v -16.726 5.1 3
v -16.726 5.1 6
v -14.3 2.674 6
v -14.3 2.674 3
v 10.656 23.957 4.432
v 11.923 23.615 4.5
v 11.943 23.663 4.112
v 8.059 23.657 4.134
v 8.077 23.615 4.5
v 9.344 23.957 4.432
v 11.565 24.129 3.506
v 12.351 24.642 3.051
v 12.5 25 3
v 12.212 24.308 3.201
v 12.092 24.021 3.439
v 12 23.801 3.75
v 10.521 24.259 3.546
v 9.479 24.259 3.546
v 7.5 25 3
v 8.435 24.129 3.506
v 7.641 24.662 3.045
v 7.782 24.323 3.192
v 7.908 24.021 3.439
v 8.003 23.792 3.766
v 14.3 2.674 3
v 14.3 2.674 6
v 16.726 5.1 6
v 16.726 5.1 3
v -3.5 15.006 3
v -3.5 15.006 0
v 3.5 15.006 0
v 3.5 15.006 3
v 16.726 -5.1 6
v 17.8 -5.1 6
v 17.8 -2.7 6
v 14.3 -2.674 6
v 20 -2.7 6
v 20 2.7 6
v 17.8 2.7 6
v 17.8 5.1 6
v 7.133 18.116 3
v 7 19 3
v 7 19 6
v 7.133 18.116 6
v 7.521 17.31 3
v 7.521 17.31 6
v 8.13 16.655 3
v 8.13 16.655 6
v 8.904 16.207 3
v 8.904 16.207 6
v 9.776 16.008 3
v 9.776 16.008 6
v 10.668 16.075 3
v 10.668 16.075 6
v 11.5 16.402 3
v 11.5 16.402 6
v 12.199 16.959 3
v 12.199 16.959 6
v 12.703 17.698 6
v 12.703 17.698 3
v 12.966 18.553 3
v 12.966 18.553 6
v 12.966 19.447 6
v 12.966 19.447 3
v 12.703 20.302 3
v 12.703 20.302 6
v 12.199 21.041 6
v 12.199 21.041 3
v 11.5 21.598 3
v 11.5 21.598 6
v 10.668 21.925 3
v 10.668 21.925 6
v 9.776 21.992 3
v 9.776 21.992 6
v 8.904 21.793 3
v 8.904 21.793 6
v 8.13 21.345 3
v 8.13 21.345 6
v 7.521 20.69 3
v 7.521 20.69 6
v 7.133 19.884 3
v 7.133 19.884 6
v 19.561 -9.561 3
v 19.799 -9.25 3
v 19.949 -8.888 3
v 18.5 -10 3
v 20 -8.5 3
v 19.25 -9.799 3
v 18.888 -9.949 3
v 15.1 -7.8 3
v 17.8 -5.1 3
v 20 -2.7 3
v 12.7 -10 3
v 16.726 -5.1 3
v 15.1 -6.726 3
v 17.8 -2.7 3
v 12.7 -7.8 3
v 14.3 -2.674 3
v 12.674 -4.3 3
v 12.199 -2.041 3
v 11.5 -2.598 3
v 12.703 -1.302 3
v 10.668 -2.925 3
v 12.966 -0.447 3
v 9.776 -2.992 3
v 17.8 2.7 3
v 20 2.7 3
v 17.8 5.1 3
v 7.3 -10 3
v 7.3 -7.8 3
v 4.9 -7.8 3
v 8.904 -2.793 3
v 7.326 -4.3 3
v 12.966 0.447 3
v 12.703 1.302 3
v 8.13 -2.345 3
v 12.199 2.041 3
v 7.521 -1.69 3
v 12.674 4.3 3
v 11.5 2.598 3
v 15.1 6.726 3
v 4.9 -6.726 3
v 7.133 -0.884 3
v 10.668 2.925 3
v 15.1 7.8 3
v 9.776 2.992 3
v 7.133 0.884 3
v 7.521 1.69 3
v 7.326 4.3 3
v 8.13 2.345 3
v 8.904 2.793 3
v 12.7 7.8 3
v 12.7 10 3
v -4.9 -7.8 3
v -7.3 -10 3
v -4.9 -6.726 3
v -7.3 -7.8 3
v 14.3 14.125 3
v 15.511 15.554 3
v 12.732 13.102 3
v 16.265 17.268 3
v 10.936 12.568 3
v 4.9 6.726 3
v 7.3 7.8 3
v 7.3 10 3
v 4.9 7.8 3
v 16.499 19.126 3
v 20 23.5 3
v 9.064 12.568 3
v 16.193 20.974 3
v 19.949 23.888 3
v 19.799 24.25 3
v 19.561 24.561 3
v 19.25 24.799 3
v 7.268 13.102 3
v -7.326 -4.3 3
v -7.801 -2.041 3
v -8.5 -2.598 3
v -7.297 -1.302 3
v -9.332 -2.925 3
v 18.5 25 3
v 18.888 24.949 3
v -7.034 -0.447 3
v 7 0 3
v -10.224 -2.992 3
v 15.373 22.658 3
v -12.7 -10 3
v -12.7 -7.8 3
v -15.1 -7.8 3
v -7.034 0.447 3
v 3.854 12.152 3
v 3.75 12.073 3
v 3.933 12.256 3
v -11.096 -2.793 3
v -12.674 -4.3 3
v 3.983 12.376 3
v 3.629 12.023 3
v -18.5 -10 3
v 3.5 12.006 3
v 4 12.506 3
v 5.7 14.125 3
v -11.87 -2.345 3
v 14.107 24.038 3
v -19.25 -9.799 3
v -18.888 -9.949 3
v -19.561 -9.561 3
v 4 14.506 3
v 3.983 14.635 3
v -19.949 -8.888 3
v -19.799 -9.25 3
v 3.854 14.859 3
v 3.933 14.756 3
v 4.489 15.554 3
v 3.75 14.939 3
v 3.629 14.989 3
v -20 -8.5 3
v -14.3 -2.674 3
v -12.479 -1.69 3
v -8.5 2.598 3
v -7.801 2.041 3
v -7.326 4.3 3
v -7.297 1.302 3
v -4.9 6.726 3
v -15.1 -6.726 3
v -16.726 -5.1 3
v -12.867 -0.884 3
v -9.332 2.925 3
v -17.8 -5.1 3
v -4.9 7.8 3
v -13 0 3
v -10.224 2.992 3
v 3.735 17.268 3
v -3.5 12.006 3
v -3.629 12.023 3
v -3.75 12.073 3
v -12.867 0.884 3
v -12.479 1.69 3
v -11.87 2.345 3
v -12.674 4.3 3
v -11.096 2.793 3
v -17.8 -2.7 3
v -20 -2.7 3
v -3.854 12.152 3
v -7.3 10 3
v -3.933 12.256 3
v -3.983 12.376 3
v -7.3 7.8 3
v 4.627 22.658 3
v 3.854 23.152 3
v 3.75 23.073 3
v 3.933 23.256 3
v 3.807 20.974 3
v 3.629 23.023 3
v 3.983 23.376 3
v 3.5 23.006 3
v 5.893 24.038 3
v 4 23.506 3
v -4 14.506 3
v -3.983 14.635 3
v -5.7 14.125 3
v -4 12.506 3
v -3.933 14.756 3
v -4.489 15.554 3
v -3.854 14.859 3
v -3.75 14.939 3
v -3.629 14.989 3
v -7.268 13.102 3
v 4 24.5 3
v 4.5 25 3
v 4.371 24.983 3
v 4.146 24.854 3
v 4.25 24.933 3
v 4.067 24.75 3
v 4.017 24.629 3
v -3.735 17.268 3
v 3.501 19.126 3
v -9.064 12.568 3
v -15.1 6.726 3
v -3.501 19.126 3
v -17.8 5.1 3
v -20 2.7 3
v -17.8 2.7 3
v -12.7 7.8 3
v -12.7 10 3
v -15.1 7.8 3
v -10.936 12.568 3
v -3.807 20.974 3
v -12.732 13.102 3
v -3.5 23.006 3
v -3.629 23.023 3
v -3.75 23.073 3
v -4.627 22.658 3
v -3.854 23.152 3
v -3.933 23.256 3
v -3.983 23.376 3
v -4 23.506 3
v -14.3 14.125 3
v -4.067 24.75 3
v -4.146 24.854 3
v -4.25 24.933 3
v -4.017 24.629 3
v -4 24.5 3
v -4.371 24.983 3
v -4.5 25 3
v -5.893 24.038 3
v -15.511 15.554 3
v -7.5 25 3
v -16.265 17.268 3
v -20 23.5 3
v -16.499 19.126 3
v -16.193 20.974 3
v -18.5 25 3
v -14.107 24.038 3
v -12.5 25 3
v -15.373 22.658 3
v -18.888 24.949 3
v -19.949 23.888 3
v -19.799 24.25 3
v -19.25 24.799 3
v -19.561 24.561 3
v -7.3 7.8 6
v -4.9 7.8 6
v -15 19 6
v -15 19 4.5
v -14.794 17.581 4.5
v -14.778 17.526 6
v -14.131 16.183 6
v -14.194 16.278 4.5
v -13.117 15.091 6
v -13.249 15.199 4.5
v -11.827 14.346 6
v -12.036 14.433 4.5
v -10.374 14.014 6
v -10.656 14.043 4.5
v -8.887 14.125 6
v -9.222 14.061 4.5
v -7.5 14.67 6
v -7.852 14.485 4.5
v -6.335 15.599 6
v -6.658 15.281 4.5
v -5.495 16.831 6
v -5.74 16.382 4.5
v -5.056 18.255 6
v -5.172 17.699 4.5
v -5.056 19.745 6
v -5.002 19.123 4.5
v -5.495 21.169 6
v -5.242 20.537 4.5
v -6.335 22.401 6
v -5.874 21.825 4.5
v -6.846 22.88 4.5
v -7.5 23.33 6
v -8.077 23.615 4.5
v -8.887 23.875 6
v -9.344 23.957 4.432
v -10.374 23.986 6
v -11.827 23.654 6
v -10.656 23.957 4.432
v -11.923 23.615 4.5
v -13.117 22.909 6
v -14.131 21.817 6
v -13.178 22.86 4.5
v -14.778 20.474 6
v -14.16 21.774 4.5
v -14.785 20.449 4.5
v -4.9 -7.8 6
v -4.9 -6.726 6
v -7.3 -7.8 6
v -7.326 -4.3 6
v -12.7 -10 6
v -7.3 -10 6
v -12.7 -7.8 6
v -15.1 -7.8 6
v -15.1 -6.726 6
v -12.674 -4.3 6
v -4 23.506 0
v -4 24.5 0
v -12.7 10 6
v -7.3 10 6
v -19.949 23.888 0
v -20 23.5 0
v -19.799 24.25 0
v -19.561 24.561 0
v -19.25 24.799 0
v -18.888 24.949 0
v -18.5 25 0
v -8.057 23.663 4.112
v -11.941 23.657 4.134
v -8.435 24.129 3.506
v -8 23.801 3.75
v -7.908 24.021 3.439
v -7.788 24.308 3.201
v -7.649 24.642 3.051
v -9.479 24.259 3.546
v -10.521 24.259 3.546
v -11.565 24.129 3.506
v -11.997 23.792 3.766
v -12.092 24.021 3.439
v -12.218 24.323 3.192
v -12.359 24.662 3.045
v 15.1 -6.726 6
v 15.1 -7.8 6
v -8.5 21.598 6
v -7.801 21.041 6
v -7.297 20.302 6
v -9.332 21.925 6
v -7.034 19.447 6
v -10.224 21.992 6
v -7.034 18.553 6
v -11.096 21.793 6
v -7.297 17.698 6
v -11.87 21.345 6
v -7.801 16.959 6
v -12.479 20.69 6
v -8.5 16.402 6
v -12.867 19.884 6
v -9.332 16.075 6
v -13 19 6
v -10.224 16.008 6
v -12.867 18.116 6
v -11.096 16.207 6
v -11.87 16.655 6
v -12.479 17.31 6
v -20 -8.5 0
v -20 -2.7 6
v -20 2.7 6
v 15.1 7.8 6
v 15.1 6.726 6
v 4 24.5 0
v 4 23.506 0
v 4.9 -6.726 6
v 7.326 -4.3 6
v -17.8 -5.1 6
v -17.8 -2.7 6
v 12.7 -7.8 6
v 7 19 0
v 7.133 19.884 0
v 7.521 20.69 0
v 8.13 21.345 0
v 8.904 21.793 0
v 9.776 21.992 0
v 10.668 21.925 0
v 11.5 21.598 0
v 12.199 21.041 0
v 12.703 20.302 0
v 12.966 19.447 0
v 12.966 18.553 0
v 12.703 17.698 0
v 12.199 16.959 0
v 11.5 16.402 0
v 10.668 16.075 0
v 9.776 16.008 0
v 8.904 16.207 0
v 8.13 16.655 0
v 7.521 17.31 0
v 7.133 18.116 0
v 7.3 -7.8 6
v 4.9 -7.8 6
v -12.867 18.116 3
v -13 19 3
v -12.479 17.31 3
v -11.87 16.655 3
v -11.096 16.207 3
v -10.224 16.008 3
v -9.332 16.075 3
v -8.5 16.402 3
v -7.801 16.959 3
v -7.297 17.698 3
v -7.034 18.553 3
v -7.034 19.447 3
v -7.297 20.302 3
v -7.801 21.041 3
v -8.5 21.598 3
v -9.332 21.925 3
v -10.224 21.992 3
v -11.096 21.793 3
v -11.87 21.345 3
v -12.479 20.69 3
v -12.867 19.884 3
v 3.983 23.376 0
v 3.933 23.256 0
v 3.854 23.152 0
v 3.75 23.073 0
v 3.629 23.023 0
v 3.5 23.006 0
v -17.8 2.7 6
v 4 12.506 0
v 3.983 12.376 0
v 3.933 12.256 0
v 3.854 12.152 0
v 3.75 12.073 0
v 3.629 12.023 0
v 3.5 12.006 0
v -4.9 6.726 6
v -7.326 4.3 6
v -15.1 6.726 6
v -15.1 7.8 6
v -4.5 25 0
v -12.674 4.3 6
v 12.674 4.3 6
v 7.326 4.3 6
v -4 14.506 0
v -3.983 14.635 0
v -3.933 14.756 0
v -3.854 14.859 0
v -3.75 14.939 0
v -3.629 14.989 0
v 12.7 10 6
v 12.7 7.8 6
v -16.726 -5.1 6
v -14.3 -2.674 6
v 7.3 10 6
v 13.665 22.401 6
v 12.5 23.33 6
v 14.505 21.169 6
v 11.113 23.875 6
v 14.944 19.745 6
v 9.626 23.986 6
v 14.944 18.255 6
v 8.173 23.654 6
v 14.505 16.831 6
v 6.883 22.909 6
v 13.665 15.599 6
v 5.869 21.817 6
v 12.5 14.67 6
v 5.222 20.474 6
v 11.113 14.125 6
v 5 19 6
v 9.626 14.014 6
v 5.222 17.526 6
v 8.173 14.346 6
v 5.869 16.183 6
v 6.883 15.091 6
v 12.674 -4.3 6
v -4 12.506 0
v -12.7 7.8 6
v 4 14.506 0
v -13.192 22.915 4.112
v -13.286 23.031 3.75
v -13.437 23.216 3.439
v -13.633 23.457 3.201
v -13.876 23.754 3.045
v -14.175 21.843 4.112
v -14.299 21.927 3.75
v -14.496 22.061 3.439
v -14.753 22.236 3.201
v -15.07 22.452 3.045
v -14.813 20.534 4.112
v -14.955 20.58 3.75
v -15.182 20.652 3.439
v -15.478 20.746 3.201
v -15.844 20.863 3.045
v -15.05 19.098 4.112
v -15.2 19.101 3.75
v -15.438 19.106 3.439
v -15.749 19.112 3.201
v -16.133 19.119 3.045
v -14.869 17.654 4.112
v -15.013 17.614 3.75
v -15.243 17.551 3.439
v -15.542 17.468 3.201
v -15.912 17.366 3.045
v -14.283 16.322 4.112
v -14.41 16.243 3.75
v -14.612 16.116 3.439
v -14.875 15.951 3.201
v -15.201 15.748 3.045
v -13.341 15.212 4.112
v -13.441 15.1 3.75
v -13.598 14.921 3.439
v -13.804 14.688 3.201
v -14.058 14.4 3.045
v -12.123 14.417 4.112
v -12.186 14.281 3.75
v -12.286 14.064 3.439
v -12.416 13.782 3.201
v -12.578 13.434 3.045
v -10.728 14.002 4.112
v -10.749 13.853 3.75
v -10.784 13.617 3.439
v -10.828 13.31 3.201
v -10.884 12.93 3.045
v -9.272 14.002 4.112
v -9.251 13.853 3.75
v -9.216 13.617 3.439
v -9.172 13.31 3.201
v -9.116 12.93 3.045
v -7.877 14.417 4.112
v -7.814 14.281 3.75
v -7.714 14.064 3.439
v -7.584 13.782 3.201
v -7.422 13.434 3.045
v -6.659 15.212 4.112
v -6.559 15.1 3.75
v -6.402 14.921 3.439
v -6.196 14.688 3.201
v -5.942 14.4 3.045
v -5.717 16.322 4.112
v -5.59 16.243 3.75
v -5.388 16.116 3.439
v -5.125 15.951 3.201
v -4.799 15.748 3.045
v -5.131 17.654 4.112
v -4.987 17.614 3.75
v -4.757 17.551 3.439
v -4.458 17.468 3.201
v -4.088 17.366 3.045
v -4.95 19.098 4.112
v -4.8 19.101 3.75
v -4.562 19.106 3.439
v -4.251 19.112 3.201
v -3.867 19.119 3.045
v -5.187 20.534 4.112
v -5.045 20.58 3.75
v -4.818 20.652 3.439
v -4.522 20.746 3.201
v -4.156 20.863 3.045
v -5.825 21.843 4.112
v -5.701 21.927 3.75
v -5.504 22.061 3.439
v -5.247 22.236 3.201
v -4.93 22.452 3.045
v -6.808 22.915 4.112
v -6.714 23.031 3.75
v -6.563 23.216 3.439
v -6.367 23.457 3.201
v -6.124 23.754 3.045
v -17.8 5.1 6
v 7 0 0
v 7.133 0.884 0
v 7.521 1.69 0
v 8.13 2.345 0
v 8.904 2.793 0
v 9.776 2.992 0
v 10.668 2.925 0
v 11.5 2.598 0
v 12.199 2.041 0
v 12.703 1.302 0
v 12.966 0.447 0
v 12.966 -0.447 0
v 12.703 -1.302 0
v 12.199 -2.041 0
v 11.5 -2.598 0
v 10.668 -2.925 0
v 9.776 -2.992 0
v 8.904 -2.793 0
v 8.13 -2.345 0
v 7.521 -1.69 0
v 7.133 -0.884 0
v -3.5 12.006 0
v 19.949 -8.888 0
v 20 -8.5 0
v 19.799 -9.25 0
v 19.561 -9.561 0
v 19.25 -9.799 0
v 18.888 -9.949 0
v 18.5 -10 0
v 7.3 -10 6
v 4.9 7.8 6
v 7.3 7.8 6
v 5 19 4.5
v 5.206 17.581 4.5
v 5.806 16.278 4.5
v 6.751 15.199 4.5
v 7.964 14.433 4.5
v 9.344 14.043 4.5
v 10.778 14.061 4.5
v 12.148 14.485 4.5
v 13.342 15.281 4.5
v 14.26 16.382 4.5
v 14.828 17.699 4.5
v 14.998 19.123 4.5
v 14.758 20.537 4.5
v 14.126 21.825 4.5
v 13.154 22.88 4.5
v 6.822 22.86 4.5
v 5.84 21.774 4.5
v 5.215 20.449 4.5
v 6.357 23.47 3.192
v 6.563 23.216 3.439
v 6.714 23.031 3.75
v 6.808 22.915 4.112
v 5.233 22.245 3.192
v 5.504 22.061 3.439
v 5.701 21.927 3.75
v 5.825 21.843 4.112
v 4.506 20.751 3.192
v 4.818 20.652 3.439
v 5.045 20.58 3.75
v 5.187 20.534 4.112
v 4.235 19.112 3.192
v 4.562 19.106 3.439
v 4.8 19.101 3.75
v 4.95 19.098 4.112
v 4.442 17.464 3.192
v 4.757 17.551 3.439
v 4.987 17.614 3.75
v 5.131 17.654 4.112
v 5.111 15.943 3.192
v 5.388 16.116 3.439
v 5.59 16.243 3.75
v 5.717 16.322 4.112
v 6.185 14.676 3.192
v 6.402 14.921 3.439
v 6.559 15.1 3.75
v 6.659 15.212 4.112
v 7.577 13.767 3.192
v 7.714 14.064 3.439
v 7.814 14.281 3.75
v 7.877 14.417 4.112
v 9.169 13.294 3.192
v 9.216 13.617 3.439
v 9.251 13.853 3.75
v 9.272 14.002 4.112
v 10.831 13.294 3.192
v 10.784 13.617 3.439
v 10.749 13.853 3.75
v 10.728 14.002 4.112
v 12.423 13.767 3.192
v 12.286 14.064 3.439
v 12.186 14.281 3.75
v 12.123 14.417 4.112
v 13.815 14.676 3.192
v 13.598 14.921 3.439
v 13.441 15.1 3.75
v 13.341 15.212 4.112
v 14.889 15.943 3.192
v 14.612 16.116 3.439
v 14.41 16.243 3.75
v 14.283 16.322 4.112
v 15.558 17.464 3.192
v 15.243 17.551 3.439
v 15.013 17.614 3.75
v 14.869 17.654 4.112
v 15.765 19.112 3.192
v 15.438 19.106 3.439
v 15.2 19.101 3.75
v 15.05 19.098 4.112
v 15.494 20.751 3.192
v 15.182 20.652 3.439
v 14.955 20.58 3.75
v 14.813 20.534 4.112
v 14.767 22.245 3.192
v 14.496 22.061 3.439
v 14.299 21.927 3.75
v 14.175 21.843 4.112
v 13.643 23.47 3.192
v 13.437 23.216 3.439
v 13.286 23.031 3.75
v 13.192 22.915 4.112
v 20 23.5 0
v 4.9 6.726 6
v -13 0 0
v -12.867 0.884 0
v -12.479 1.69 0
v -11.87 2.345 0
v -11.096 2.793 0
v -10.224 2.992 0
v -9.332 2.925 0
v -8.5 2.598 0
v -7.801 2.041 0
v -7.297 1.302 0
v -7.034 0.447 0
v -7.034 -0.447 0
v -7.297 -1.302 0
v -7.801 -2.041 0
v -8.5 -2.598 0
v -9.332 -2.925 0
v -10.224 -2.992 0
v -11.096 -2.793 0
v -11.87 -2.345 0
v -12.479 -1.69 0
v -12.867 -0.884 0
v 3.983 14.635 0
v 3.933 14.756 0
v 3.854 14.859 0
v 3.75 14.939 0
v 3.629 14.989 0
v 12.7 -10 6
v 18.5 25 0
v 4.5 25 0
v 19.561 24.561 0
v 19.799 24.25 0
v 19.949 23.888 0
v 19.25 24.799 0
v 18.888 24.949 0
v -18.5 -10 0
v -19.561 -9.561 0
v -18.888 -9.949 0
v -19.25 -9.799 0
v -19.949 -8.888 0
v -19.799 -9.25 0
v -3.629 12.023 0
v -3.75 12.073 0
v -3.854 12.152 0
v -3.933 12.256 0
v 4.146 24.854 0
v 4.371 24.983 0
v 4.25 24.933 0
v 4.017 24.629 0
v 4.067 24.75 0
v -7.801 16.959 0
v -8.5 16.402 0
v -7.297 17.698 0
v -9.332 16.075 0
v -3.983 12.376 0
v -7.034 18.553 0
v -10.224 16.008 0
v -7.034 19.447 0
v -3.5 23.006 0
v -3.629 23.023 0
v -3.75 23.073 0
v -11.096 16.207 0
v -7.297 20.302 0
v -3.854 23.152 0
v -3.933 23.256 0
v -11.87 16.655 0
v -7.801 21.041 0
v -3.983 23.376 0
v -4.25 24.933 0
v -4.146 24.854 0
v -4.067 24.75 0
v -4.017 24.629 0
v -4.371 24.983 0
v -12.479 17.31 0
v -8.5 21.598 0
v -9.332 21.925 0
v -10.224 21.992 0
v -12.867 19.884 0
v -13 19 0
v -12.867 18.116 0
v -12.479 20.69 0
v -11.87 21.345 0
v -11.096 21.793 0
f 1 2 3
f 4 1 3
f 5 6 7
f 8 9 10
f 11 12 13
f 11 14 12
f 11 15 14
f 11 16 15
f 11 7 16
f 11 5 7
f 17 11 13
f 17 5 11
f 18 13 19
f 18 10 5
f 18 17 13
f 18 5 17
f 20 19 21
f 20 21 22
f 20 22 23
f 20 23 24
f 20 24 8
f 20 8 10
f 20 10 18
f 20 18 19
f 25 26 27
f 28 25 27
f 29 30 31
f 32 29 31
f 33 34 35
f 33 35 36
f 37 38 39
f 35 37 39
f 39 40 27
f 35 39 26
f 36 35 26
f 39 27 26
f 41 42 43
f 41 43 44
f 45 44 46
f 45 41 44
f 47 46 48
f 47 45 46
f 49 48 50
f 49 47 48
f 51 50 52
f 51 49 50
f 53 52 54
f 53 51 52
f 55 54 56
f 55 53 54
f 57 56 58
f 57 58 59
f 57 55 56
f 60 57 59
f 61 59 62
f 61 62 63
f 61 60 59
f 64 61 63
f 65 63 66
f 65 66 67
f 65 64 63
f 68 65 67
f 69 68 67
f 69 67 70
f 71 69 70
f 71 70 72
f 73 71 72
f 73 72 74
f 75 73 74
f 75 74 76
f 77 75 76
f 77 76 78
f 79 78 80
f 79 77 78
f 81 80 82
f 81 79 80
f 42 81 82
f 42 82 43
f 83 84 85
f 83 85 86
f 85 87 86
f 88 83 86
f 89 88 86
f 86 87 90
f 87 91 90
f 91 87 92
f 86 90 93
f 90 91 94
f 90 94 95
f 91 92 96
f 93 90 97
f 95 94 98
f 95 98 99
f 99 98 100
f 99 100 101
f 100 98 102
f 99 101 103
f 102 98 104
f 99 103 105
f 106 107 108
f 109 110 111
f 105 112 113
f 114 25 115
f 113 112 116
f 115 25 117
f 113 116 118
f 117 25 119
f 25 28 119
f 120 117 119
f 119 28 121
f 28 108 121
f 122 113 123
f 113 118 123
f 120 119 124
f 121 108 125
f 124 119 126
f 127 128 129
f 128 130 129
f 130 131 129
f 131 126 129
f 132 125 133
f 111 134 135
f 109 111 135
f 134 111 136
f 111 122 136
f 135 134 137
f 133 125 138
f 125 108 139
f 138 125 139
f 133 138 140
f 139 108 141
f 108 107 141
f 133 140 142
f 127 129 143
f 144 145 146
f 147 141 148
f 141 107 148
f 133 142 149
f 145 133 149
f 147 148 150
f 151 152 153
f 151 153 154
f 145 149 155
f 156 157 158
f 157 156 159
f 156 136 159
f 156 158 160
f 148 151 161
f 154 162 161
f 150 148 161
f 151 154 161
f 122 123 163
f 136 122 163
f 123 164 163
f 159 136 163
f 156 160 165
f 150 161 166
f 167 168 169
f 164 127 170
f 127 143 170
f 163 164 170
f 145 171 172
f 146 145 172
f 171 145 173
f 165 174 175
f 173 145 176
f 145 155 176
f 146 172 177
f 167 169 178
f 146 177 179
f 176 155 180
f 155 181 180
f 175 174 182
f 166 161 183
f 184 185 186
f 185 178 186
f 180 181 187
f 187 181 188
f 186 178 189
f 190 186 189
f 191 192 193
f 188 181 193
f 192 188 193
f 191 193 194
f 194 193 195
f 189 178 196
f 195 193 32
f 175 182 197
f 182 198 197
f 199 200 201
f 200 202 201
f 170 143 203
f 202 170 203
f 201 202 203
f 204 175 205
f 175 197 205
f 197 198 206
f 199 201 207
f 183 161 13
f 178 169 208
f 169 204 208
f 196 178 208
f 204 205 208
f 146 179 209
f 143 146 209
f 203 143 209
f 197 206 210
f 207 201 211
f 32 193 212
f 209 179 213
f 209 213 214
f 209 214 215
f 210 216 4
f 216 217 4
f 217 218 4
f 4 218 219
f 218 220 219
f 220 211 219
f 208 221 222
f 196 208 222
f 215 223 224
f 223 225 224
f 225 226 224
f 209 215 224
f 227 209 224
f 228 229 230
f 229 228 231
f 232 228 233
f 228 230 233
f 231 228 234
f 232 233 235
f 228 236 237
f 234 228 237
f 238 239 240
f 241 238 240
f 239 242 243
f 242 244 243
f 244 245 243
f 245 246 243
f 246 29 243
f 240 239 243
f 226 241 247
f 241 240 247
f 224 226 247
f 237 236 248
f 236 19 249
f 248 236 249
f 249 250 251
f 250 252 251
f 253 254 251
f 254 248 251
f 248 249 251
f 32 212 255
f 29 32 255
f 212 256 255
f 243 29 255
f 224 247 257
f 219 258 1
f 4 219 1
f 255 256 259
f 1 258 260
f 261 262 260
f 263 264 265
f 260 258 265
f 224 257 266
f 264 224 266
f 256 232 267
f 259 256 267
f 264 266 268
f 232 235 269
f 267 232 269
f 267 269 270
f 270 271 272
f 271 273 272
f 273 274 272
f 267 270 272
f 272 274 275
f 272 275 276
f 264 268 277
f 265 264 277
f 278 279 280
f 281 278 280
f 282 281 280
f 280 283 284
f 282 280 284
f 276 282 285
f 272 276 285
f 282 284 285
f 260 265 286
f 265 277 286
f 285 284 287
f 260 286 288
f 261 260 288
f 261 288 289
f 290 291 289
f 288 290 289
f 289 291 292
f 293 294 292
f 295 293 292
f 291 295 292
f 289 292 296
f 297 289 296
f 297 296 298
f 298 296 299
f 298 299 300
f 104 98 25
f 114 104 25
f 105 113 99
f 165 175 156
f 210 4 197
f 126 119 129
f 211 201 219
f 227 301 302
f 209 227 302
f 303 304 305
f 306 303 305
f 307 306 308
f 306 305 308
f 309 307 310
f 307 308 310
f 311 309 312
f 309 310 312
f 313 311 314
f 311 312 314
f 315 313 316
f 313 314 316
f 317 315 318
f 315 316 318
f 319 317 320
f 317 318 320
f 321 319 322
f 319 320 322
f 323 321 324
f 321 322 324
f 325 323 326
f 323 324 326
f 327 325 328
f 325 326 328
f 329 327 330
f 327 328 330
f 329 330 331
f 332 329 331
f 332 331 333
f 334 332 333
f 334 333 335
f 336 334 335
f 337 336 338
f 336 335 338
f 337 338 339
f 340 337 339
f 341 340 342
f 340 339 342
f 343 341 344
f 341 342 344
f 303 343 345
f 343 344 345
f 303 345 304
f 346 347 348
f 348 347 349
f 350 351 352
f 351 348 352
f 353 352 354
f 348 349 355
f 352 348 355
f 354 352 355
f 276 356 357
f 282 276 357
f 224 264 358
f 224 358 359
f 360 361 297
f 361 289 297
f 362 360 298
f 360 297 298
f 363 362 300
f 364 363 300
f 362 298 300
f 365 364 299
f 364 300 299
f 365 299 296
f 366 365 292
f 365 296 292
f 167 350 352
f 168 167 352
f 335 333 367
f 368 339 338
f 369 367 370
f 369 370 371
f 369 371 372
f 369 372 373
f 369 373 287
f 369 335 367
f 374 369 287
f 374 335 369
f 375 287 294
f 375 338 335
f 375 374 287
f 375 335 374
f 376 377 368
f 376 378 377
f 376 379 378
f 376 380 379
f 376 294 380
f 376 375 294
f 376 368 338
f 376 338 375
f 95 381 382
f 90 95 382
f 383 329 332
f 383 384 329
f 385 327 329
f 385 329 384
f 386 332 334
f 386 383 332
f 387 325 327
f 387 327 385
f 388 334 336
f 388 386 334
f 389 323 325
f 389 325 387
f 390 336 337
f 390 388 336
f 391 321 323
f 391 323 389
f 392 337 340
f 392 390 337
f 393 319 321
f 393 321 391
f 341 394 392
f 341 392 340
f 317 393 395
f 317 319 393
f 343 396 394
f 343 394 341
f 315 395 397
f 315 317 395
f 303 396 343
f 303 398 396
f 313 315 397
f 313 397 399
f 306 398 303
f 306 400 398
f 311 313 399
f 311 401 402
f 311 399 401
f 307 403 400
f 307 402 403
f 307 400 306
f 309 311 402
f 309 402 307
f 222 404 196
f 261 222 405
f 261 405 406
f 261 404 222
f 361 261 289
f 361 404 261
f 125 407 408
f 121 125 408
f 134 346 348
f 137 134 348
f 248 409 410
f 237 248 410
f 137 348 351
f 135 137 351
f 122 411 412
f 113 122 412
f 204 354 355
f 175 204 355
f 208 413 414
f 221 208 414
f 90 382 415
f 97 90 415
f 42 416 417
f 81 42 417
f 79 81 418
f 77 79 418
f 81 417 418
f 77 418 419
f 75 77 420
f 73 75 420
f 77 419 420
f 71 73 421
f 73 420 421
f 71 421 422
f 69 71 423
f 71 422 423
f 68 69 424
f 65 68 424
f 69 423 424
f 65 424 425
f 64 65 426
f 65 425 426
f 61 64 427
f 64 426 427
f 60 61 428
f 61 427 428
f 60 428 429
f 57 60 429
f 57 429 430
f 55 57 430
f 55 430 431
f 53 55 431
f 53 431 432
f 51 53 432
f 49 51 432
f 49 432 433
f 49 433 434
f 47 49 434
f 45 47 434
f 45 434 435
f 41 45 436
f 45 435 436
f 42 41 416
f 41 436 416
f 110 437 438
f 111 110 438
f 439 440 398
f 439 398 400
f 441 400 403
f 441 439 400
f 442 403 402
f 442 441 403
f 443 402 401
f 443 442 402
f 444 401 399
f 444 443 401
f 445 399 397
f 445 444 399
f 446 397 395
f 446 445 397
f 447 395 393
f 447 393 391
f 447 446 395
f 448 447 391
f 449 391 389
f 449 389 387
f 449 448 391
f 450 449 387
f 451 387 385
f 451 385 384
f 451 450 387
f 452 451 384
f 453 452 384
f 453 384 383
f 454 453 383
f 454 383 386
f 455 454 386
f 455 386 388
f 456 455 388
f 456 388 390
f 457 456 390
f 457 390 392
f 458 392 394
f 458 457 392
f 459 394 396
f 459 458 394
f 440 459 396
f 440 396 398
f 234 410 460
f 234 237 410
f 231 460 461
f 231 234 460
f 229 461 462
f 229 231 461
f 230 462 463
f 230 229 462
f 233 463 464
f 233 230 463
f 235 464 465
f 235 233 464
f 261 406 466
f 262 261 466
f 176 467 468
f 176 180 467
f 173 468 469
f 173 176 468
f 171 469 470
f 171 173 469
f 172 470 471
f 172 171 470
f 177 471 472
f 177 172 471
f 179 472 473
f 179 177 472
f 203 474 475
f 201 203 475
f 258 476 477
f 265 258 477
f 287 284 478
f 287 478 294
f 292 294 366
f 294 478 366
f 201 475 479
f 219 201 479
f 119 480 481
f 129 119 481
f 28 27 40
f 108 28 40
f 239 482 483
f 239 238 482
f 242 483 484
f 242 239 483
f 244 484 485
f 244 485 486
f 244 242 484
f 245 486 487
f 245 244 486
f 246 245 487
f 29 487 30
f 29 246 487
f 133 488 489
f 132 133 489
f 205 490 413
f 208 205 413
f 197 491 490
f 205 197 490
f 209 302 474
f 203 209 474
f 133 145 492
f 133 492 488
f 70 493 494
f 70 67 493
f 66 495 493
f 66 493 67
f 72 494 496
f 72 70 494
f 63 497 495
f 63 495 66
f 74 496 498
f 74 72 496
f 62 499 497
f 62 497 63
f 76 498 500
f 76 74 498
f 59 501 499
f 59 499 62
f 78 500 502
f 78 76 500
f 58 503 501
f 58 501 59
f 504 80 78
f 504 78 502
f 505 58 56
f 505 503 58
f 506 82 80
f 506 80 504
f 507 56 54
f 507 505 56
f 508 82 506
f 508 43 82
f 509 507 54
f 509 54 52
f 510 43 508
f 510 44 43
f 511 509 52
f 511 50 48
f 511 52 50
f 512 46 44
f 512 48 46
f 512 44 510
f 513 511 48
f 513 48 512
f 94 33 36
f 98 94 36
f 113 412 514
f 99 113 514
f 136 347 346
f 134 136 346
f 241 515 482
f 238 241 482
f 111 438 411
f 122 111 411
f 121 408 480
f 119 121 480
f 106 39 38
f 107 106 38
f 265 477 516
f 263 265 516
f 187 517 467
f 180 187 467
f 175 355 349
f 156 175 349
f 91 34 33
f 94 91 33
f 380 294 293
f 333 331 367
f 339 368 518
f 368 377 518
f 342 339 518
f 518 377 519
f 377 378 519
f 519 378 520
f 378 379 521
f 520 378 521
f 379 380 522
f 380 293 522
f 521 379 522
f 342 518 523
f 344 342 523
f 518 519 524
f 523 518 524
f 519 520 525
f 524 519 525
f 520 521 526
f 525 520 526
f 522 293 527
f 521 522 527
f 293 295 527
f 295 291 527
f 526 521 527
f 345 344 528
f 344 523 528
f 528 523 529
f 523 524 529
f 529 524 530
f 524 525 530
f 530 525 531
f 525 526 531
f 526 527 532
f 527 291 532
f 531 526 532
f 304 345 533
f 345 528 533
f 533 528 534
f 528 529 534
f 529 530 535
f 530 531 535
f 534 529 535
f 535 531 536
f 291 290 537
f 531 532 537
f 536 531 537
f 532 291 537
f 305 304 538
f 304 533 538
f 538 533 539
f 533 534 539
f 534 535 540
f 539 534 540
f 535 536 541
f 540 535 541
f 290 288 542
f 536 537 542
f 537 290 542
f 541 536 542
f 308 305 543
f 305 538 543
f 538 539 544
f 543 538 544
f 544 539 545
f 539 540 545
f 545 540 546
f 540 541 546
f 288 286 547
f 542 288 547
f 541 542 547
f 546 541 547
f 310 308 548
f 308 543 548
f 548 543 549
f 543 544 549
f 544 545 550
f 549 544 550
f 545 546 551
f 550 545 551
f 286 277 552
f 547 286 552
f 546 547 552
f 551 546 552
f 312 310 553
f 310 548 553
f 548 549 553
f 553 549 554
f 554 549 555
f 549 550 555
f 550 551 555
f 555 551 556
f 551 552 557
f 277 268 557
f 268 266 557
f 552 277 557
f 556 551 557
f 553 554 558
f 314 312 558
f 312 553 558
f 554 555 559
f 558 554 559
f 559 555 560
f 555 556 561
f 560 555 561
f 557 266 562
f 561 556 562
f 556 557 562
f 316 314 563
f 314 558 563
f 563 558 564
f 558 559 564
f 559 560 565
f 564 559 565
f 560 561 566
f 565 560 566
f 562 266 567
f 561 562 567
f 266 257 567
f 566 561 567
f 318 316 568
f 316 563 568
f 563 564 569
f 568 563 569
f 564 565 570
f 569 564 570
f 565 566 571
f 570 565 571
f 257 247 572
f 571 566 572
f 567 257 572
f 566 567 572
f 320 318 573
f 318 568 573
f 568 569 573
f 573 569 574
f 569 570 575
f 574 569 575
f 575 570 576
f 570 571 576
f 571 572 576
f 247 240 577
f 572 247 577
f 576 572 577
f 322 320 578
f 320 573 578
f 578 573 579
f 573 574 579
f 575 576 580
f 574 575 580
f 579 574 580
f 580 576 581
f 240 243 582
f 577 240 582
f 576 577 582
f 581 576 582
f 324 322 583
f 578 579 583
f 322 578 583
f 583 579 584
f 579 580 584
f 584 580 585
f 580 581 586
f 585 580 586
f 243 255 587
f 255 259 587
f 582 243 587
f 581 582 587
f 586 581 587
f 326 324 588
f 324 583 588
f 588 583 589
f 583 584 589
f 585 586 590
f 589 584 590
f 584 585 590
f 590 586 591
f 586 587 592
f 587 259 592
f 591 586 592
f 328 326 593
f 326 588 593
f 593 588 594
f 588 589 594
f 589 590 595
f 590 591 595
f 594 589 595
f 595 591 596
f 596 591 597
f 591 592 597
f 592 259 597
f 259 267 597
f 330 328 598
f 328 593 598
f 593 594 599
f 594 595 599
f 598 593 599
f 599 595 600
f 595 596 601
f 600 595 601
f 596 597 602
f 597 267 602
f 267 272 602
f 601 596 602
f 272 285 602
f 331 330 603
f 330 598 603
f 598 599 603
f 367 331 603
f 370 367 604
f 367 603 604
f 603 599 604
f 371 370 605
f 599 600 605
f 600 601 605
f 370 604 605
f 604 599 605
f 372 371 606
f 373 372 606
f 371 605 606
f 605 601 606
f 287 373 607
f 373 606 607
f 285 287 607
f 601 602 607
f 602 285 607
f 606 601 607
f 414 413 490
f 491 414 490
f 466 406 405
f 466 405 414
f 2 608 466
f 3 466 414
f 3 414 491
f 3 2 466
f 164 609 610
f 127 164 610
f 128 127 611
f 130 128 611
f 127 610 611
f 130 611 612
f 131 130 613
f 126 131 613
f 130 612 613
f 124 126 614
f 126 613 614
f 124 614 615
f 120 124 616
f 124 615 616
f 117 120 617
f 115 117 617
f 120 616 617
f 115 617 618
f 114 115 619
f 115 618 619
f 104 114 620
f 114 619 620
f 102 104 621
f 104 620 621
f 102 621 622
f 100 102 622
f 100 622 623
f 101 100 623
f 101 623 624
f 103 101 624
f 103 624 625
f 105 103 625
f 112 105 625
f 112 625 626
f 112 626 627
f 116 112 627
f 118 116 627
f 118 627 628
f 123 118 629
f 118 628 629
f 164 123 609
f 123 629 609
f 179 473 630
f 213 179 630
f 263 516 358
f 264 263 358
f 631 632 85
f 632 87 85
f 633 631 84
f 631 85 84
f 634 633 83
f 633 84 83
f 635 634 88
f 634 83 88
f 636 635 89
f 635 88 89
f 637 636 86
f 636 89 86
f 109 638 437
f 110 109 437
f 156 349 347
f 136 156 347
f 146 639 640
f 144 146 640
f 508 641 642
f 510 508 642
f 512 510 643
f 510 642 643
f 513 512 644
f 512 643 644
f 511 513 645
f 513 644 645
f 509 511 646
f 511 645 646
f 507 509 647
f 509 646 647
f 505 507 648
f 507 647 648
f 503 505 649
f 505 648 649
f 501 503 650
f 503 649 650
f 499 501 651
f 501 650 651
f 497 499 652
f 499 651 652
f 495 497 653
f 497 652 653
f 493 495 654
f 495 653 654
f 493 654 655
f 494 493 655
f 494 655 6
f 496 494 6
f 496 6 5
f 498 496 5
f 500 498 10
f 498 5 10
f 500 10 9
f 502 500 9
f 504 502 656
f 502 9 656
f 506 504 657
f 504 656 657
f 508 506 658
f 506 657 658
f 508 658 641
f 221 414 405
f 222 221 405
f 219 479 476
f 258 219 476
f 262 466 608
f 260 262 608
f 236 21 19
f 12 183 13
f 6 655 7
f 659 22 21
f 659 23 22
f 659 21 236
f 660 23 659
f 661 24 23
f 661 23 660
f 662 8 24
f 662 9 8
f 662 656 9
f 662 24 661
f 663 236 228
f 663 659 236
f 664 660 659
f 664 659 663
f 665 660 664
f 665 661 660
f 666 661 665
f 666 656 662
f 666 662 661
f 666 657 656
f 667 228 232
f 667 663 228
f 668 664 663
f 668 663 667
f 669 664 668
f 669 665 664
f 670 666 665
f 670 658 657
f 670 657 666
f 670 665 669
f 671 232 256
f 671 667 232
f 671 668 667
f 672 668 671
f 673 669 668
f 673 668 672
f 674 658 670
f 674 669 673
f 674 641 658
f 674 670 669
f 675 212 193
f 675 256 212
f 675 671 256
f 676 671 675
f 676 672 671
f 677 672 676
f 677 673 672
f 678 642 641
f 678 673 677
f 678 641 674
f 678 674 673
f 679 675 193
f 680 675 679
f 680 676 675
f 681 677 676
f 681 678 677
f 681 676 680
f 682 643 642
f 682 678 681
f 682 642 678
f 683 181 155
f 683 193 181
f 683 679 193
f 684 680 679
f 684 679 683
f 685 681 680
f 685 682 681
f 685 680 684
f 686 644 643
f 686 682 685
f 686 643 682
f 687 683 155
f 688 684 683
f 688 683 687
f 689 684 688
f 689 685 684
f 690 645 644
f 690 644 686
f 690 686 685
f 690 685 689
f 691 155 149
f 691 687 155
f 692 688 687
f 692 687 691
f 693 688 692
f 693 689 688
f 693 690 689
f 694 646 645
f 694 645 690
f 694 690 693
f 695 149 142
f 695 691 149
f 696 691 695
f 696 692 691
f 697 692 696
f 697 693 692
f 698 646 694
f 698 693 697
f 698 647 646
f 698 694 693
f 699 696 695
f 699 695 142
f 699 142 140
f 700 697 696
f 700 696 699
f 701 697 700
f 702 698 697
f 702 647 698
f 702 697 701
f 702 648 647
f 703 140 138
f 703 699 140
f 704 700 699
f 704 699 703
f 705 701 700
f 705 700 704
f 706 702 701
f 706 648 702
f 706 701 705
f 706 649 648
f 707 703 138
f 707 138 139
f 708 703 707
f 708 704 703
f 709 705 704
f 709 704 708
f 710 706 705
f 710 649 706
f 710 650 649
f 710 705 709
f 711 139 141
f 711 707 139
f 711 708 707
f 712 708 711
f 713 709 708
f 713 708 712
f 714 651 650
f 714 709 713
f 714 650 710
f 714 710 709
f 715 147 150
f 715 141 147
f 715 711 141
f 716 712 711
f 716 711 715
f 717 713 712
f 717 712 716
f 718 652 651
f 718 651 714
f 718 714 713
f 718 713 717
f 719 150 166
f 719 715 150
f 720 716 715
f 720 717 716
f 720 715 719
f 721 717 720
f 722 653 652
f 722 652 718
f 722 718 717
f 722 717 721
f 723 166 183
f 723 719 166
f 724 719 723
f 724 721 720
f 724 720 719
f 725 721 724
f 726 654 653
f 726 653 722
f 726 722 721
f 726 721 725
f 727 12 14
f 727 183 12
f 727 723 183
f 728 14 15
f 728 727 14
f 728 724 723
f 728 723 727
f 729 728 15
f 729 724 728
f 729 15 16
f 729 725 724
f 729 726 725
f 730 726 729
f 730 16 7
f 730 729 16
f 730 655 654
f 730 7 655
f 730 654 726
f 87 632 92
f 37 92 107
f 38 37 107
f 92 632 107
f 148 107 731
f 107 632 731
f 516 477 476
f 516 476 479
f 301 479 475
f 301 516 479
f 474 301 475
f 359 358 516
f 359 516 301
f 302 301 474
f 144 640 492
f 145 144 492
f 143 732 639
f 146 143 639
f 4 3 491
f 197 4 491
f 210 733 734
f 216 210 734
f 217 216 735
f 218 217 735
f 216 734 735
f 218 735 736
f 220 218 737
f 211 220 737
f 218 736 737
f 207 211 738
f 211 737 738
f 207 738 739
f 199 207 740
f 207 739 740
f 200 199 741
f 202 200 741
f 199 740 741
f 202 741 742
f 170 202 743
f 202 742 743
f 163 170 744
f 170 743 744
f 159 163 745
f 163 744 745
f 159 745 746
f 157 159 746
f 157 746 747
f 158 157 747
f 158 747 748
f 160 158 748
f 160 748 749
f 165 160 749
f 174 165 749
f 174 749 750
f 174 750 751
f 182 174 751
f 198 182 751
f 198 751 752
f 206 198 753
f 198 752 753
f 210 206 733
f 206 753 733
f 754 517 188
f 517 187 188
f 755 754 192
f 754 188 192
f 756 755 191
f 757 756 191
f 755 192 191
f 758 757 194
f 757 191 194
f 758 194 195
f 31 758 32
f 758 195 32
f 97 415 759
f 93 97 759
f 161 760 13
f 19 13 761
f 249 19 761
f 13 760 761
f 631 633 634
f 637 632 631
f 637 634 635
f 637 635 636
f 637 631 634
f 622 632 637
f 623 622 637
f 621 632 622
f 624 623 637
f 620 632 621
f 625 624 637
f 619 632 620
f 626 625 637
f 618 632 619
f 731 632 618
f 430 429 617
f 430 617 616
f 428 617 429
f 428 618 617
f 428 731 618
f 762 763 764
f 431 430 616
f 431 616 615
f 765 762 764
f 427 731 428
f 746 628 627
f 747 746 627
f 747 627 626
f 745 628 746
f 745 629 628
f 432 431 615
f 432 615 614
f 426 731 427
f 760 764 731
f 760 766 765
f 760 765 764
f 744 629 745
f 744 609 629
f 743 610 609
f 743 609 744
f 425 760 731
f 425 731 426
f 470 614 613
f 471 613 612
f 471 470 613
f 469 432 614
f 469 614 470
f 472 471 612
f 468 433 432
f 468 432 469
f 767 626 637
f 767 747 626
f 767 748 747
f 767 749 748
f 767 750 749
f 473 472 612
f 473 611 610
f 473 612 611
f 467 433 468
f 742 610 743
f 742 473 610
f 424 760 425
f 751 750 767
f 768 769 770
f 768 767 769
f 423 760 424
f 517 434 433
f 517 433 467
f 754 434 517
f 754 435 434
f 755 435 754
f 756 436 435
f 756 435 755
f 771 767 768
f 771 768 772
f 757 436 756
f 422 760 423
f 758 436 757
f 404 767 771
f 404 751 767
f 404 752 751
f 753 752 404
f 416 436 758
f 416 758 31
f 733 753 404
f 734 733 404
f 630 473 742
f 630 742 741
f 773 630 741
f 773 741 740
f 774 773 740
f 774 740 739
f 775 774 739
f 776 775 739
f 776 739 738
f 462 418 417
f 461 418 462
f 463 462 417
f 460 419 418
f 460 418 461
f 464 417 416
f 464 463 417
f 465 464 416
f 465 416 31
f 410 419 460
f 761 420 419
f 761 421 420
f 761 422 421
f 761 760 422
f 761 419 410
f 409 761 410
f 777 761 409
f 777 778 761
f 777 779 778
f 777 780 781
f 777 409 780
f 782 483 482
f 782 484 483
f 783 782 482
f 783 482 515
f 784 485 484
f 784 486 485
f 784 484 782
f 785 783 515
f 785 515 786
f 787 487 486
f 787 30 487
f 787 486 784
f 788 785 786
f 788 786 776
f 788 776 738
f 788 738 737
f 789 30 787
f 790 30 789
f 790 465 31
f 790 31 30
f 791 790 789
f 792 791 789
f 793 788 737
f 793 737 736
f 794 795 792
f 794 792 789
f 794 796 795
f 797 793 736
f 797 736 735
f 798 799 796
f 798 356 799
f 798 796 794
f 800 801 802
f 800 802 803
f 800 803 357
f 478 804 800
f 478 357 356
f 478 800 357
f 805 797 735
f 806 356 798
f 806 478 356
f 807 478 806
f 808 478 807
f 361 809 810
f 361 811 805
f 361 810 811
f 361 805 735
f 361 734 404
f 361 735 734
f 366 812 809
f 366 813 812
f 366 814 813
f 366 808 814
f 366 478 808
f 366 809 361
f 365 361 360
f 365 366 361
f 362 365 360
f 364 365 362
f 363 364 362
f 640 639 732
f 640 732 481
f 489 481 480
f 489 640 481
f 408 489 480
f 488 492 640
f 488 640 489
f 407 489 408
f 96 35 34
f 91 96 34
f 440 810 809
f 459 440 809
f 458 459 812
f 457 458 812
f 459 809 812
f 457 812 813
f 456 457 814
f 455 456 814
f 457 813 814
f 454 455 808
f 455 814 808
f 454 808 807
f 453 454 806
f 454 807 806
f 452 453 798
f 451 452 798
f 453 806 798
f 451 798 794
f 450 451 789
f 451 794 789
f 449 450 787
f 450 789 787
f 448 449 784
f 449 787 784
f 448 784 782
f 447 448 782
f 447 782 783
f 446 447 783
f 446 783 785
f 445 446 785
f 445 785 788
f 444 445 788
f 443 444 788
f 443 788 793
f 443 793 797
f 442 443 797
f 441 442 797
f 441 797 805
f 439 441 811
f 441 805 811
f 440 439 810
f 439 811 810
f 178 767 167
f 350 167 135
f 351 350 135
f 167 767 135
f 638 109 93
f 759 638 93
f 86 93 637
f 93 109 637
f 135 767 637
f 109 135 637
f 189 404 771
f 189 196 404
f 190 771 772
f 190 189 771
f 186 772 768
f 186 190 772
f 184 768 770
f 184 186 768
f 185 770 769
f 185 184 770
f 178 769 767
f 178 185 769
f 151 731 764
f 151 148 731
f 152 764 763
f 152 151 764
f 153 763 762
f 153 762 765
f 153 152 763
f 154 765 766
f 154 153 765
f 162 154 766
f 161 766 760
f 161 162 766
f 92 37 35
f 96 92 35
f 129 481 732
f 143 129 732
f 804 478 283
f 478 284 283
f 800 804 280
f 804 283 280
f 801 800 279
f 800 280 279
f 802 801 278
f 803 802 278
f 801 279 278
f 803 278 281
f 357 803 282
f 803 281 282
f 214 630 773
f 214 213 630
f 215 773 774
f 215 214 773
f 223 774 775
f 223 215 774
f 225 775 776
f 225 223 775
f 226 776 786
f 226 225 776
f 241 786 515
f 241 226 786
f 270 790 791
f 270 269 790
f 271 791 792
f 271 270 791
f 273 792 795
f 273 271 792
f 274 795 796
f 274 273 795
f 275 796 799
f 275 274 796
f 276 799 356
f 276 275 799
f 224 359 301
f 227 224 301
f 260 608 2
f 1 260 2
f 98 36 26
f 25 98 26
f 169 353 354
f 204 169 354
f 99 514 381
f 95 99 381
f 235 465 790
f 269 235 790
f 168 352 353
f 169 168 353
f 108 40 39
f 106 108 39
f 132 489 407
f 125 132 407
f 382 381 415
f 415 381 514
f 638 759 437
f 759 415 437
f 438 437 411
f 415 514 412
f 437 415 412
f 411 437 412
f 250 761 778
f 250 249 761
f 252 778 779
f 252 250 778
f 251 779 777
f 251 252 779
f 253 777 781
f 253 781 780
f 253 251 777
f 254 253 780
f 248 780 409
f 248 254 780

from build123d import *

# Parameters (mm, degrees)
SKETCH_1_W          = 40
SKETCH_1_H          = 20
EXTRUDE_1_DEPTH     = 3
EXTRUDE_2_DEPTH     = 3
SKETCH_3_R          = 3
CUT_EXTRUDE_1_DEPTH = 3
SKETCH_4_W          = 40
SKETCH_4_H          = 15
SKETCH_4_R          = 3
EXTRUDE_3_DEPTH     = 3
FILLET_3_R          = 1.5
SKETCH_5_R          = 5
SKETCH_5_R_2        = 3
EXTRUDE_4_DEPTH     = 3
FILLET_4_R          = 1.5
CUT_EXTRUDE_2_DEPTH = 10
FILLET_6_R          = 0.5
CUT_EXTRUDE_3_DEPTH = 3


with BuildPart() as part:
    # 草图1 → 凸台-拉伸1 (new body)
    with BuildSketch(Plane.XY):
        Rectangle(SKETCH_1_W, SKETCH_1_H)
    extrude(amount=EXTRUDE_1_DEPTH)

    # 草图2 → 凸台-拉伸2 (add)
    with BuildSketch(Plane.XY.offset(3)):
        Polygon((-6.9, 8.2), (-6.9, 10), (-13.1, 10), (-13.1, 8.2), (-15.5, 8.2), (-15.5, 6.560660172), (-12.839339828, 3.9), (-7.160660172, 3.9), (-4.5, 6.560660172), (-4.5, 8.2), align=None)
        Polygon((-16.560660172, 5.5), (-18.2, 5.5), (-18.2, 3.1), (-20, 3.1), (-20, -3.1), (-18.2, -3.1), (-18.2, -5.5), (-16.560660172, -5.5), (-13.9, -2.839339828), (-13.9, 2.839339828), align=None)
        Polygon((-12.839339828, -3.9), (-7.160660172, -3.9), (-4.5, -6.560660172), (-4.5, -8.2), (-6.9, -8.2), (-6.9, -10), (-13.1, -10), (-13.1, -8.2), (-15.5, -8.2), (-15.5, -6.560660172), align=None)
        Polygon((18.2, 3.1), (20, 3.1), (20, -3.1), (18.2, -3.1), (18.2, -5.5), (16.560660172, -5.5), (13.9, -2.839339828), (13.9, 2.839339828), (16.560660172, 5.5), (18.2, 5.5), align=None)
        Polygon((13.1, 8.2), (13.1, 10), (6.9, 10), (6.9, 8.2), (4.5, 8.2), (4.5, 6.560660172), (7.160660172, 3.9), (12.839339828, 3.9), (15.5, 6.560660172), (15.5, 8.2), align=None)
        Polygon((7.160660172, -3.9), (12.839339828, -3.9), (15.5, -6.560660172), (15.5, -8.2), (13.1, -8.2), (13.1, -10), (6.9, -10), (6.9, -8.2), (4.5, -8.2), (4.5, -6.560660172), align=None)
    extrude(amount=EXTRUDE_2_DEPTH)

    # 草图3 → 切除-拉伸1 (cut)
    with BuildSketch(Plane(origin=(0, 0, 0), x_dir=(-1, 0, 0), z_dir=(0, 0, -1))):
        with Locations((-10, 0)):
            Circle(SKETCH_3_R)
        with Locations((10, 0)):
            Circle(SKETCH_3_R)
    extrude(amount=-CUT_EXTRUDE_1_DEPTH, mode=Mode.SUBTRACT)

    # 草图4 → 凸台-拉伸3 (add)
    with BuildSketch(Plane(origin=(0, 0, 0), x_dir=(-1, 0, 0), z_dir=(0, 0, -1))):
        with Locations((0, 17.5)):
            Rectangle(SKETCH_4_W, SKETCH_4_H)
        with Locations((-10, 19)):
            Circle(SKETCH_4_R, mode=Mode.SUBTRACT)
        with Locations((10, 19)):
            Circle(SKETCH_4_R, mode=Mode.SUBTRACT)
    extrude(amount=-EXTRUDE_3_DEPTH)

    # 圆角3
    fillet_3_edges = [part.edges().sort_by_distance(p)[0] for p in [
        (20, 25, 1.5),
        (-20, 25, 1.5),
        (20, -10, 1.5),
        (-20, -10, 1.5),
    ]]
    fillet(fillet_3_edges, radius=FILLET_3_R)

    # 草图5 → 凸台-拉伸4 (add)
    # profile 1 of 2: a face of its own
    with BuildSketch(Plane.XY.offset(3)):
        with Locations(Location((-10, 19, 0), (0, 0, 180))):
            Circle(SKETCH_5_R)
        with Locations(Location((-10, 19, 0), (0, 0, 180))):
            Circle(SKETCH_5_R_2, mode=Mode.SUBTRACT)
    # profile 2 of 2: a face of its own
    with BuildSketch(Plane.XY.offset(3)):
        with Locations(Location((10, 19, 0), (0, 0, 180))):
            Circle(SKETCH_5_R)
        with Locations(Location((10, 19, 0), (0, 0, 180))):
            Circle(SKETCH_5_R_2, mode=Mode.SUBTRACT)
    extrude(amount=EXTRUDE_4_DEPTH)

    # 圆角4
    fillet_4_edges = [part.edges().sort_by_distance(p)[0] for p in [
        (-5, 19, 3),
        (15, 19, 3),
    ]]
    fillet(fillet_4_edges, radius=FILLET_4_R)

    # 草图6 → 切除-拉伸2 (cut)
    with BuildSketch(Plane(origin=(0, 0, 0), x_dir=(-1, 0, 0), z_dir=(0, 0, -1))):
        Polygon((0, 23.005790595), (4, 23.005790595), (4, 25), (-4, 25), (-4, 23.005790595), align=None)
        Polygon((0, 15.005790595), (-4, 15.005790595), (-4, 12.005790595), (4, 12.005790595), (4, 15.005790595), align=None)
    extrude(amount=-CUT_EXTRUDE_2_DEPTH, mode=Mode.SUBTRACT)

    # 圆角6
    fillet_6_edges = [part.edges().sort_by_distance(p)[0] for p in [
        (4, 25, 1.5),
        (-4, 25, 1.5),
        (-4, 23.005790595, 1.5),
        (4, 23.005790595, 1.5),
        (4, 12.005790595, 1.5),
        (4, 15.005790595, 1.5),
        (-4, 15.005790595, 1.5),
        (-4, 12.005790595, 1.5),
    ]]
    fillet(fillet_6_edges, radius=FILLET_6_R)

    # 草图7 → 切除-拉伸3 (cut)
    with BuildSketch(Plane.XY.offset(6)):
        Polygon((-18.2, -3.1), (-18.2, -5.5), (-16.560660172, -5.5), (-13.9, -2.839339828), (-13.9, 2.839339828), (-16.560660172, 5.5), (-18.2, 5.5), (-18.2, 3.1), (-20, 3.1), (-20, 2.7), (-19.6, 2.7), (-17.8, 2.7), (-17.8, 5.1), (-16.726345597, 5.1), (-14.3, 2.673654403), (-14.3, -2.673654403), (-16.726345597, -5.1), (-17.8, -5.1), (-17.8, -2.7), (-19.6, -2.7), (-20, -2.7), (-20, -3.1), align=None)
        Polygon((-12.839339828, -3.9), (-15.5, -6.560660172), (-15.5, -8.2), (-13.1, -8.2), (-13.1, -10), (-12.7, -10), (-12.7, -9.6), (-12.7, -7.8), (-15.1, -7.8), (-15.1, -6.726345597), (-12.673654403, -4.3), (-7.326345597, -4.3), (-4.9, -6.726345597), (-4.9, -7.8), (-7.3, -7.8), (-7.3, -9.6), (-7.3, -10), (-6.9, -10), (-6.9, -8.2), (-4.5, -8.2), (-4.5, -6.560660172), (-7.160660172, -3.9), align=None)
        Polygon((-4.5, 8.2), (-6.9, 8.2), (-6.9, 10), (-7.3, 10), (-7.3, 9.6), (-7.3, 7.8), (-4.9, 7.8), (-4.9, 6.726345597), (-7.326345597, 4.3), (-12.673654403, 4.3), (-15.1, 6.726345597), (-15.1, 7.8), (-12.7, 7.8), (-12.7, 9.6), (-12.7, 10), (-13.1, 10), (-13.1, 8.2), (-15.5, 8.2), (-15.5, 6.560660172), (-12.839339828, 3.9), (-7.160660172, 3.9), (-4.5, 6.560660172), align=None)
        Polygon((15.5, 8.2), (13.1, 8.2), (13.1, 10), (12.7, 10), (12.7, 9.6), (12.7, 7.8), (15.1, 7.8), (15.1, 6.726345597), (12.673654403, 4.3), (7.326345597, 4.3), (4.9, 6.726345597), (4.9, 7.8), (7.3, 7.8), (7.3, 9.6), (7.3, 10), (6.9, 10), (6.9, 8.2), (4.5, 8.2), (4.5, 6.560660172), (7.160660172, 3.9), (12.839339828, 3.9), (15.5, 6.560660172), align=None)
        Polygon((18.2, 3.1), (18.2, 5.5), (16.560660172, 5.5), (13.9, 2.839339828), (13.9, -2.839339828), (16.560660172, -5.5), (18.2, -5.5), (18.2, -3.1), (20, -3.1), (20, -2.7), (19.6, -2.7), (17.8, -2.7), (17.8, -5.1), (16.726345597, -5.1), (14.3, -2.673654403), (14.3, 2.673654403), (16.726345597, 5.1), (17.8, 5.1), (17.8, 2.7), (19.6, 2.7), (20, 2.7), (20, 3.1), align=None)
        Polygon((7.160660172, -3.9), (4.5, -6.560660172), (4.5, -8.2), (6.9, -8.2), (6.9, -10), (7.3, -10), (7.3, -9.6), (7.3, -7.8), (4.9, -7.8), (4.9, -6.726345597), (7.326345597, -4.3), (12.673654403, -4.3), (15.1, -6.726345597), (15.1, -7.8), (12.7, -7.8), (12.7, -9.6), (12.7, -10), (13.1, -10), (13.1, -8.2), (15.5, -8.2), (15.5, -6.560660172), (12.839339828, -3.9), align=None)
    extrude(amount=-CUT_EXTRUDE_3_DEPTH, mode=Mode.SUBTRACT)


solid = part.part
